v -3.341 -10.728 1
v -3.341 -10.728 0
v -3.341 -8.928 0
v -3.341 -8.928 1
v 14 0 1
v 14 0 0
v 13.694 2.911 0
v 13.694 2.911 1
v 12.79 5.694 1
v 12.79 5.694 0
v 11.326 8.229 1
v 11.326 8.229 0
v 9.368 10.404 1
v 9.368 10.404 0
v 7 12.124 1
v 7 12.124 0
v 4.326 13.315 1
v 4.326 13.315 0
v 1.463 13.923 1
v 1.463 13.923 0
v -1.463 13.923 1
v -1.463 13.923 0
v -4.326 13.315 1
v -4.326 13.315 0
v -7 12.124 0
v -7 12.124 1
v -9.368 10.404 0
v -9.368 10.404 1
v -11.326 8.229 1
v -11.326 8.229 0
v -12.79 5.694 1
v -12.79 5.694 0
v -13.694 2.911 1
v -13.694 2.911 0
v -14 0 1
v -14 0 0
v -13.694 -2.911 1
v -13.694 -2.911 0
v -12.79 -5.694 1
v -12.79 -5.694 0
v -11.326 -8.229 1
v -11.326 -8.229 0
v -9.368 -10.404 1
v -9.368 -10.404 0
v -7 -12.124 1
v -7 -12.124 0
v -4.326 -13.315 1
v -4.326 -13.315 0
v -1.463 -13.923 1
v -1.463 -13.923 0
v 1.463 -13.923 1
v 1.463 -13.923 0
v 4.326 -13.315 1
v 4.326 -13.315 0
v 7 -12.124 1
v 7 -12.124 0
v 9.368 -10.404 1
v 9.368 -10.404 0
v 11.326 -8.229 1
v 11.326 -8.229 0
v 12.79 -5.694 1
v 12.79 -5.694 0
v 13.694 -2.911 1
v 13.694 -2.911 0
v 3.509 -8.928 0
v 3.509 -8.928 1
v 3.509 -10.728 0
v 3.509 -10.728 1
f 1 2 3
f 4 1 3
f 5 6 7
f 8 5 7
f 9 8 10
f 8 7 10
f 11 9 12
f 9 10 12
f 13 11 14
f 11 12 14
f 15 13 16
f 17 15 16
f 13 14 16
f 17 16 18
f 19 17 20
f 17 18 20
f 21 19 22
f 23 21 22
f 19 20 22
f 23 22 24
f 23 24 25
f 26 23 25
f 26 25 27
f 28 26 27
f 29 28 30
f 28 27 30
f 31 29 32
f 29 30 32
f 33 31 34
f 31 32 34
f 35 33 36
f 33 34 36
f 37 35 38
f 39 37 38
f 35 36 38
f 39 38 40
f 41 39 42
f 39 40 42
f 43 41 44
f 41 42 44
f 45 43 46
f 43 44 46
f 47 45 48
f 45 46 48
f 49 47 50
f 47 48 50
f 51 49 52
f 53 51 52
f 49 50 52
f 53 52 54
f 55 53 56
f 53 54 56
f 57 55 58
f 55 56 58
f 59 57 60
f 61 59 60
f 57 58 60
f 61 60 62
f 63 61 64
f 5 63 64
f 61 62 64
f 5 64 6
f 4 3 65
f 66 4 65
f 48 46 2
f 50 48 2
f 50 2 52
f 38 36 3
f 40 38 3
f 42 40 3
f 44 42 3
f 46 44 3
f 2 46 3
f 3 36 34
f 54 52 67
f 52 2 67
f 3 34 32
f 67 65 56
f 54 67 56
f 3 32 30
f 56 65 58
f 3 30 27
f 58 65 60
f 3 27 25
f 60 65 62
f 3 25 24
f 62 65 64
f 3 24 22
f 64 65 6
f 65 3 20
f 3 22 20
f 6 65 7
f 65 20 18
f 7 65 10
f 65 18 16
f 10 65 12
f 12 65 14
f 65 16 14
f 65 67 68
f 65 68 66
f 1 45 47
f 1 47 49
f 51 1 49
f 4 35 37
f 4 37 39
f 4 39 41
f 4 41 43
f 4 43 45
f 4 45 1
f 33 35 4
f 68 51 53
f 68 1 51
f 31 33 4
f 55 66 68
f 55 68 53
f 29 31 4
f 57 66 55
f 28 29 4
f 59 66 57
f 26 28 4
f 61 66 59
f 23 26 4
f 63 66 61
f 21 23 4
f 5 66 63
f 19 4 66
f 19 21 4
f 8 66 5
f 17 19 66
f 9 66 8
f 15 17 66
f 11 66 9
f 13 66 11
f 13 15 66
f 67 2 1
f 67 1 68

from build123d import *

# Parameters (mm, degrees)
SKETCH1_R           = 14
SKETCH1_W           = 6.85
SKETCH1_H           = 1.8
BOSS_EXTRUDE4_DEPTH = 1


with BuildPart() as part:
    # Sketch1 → Boss-Extrude4 (new body)
    with BuildSketch(Plane.XY):
        Circle(SKETCH1_R)
        with Locations((0.084285819, -9.827892173)):
            Rectangle(SKETCH1_W, SKETCH1_H, mode=Mode.SUBTRACT)
    extrude(amount=BOSS_EXTRUDE4_DEPTH)


solid = part.part
